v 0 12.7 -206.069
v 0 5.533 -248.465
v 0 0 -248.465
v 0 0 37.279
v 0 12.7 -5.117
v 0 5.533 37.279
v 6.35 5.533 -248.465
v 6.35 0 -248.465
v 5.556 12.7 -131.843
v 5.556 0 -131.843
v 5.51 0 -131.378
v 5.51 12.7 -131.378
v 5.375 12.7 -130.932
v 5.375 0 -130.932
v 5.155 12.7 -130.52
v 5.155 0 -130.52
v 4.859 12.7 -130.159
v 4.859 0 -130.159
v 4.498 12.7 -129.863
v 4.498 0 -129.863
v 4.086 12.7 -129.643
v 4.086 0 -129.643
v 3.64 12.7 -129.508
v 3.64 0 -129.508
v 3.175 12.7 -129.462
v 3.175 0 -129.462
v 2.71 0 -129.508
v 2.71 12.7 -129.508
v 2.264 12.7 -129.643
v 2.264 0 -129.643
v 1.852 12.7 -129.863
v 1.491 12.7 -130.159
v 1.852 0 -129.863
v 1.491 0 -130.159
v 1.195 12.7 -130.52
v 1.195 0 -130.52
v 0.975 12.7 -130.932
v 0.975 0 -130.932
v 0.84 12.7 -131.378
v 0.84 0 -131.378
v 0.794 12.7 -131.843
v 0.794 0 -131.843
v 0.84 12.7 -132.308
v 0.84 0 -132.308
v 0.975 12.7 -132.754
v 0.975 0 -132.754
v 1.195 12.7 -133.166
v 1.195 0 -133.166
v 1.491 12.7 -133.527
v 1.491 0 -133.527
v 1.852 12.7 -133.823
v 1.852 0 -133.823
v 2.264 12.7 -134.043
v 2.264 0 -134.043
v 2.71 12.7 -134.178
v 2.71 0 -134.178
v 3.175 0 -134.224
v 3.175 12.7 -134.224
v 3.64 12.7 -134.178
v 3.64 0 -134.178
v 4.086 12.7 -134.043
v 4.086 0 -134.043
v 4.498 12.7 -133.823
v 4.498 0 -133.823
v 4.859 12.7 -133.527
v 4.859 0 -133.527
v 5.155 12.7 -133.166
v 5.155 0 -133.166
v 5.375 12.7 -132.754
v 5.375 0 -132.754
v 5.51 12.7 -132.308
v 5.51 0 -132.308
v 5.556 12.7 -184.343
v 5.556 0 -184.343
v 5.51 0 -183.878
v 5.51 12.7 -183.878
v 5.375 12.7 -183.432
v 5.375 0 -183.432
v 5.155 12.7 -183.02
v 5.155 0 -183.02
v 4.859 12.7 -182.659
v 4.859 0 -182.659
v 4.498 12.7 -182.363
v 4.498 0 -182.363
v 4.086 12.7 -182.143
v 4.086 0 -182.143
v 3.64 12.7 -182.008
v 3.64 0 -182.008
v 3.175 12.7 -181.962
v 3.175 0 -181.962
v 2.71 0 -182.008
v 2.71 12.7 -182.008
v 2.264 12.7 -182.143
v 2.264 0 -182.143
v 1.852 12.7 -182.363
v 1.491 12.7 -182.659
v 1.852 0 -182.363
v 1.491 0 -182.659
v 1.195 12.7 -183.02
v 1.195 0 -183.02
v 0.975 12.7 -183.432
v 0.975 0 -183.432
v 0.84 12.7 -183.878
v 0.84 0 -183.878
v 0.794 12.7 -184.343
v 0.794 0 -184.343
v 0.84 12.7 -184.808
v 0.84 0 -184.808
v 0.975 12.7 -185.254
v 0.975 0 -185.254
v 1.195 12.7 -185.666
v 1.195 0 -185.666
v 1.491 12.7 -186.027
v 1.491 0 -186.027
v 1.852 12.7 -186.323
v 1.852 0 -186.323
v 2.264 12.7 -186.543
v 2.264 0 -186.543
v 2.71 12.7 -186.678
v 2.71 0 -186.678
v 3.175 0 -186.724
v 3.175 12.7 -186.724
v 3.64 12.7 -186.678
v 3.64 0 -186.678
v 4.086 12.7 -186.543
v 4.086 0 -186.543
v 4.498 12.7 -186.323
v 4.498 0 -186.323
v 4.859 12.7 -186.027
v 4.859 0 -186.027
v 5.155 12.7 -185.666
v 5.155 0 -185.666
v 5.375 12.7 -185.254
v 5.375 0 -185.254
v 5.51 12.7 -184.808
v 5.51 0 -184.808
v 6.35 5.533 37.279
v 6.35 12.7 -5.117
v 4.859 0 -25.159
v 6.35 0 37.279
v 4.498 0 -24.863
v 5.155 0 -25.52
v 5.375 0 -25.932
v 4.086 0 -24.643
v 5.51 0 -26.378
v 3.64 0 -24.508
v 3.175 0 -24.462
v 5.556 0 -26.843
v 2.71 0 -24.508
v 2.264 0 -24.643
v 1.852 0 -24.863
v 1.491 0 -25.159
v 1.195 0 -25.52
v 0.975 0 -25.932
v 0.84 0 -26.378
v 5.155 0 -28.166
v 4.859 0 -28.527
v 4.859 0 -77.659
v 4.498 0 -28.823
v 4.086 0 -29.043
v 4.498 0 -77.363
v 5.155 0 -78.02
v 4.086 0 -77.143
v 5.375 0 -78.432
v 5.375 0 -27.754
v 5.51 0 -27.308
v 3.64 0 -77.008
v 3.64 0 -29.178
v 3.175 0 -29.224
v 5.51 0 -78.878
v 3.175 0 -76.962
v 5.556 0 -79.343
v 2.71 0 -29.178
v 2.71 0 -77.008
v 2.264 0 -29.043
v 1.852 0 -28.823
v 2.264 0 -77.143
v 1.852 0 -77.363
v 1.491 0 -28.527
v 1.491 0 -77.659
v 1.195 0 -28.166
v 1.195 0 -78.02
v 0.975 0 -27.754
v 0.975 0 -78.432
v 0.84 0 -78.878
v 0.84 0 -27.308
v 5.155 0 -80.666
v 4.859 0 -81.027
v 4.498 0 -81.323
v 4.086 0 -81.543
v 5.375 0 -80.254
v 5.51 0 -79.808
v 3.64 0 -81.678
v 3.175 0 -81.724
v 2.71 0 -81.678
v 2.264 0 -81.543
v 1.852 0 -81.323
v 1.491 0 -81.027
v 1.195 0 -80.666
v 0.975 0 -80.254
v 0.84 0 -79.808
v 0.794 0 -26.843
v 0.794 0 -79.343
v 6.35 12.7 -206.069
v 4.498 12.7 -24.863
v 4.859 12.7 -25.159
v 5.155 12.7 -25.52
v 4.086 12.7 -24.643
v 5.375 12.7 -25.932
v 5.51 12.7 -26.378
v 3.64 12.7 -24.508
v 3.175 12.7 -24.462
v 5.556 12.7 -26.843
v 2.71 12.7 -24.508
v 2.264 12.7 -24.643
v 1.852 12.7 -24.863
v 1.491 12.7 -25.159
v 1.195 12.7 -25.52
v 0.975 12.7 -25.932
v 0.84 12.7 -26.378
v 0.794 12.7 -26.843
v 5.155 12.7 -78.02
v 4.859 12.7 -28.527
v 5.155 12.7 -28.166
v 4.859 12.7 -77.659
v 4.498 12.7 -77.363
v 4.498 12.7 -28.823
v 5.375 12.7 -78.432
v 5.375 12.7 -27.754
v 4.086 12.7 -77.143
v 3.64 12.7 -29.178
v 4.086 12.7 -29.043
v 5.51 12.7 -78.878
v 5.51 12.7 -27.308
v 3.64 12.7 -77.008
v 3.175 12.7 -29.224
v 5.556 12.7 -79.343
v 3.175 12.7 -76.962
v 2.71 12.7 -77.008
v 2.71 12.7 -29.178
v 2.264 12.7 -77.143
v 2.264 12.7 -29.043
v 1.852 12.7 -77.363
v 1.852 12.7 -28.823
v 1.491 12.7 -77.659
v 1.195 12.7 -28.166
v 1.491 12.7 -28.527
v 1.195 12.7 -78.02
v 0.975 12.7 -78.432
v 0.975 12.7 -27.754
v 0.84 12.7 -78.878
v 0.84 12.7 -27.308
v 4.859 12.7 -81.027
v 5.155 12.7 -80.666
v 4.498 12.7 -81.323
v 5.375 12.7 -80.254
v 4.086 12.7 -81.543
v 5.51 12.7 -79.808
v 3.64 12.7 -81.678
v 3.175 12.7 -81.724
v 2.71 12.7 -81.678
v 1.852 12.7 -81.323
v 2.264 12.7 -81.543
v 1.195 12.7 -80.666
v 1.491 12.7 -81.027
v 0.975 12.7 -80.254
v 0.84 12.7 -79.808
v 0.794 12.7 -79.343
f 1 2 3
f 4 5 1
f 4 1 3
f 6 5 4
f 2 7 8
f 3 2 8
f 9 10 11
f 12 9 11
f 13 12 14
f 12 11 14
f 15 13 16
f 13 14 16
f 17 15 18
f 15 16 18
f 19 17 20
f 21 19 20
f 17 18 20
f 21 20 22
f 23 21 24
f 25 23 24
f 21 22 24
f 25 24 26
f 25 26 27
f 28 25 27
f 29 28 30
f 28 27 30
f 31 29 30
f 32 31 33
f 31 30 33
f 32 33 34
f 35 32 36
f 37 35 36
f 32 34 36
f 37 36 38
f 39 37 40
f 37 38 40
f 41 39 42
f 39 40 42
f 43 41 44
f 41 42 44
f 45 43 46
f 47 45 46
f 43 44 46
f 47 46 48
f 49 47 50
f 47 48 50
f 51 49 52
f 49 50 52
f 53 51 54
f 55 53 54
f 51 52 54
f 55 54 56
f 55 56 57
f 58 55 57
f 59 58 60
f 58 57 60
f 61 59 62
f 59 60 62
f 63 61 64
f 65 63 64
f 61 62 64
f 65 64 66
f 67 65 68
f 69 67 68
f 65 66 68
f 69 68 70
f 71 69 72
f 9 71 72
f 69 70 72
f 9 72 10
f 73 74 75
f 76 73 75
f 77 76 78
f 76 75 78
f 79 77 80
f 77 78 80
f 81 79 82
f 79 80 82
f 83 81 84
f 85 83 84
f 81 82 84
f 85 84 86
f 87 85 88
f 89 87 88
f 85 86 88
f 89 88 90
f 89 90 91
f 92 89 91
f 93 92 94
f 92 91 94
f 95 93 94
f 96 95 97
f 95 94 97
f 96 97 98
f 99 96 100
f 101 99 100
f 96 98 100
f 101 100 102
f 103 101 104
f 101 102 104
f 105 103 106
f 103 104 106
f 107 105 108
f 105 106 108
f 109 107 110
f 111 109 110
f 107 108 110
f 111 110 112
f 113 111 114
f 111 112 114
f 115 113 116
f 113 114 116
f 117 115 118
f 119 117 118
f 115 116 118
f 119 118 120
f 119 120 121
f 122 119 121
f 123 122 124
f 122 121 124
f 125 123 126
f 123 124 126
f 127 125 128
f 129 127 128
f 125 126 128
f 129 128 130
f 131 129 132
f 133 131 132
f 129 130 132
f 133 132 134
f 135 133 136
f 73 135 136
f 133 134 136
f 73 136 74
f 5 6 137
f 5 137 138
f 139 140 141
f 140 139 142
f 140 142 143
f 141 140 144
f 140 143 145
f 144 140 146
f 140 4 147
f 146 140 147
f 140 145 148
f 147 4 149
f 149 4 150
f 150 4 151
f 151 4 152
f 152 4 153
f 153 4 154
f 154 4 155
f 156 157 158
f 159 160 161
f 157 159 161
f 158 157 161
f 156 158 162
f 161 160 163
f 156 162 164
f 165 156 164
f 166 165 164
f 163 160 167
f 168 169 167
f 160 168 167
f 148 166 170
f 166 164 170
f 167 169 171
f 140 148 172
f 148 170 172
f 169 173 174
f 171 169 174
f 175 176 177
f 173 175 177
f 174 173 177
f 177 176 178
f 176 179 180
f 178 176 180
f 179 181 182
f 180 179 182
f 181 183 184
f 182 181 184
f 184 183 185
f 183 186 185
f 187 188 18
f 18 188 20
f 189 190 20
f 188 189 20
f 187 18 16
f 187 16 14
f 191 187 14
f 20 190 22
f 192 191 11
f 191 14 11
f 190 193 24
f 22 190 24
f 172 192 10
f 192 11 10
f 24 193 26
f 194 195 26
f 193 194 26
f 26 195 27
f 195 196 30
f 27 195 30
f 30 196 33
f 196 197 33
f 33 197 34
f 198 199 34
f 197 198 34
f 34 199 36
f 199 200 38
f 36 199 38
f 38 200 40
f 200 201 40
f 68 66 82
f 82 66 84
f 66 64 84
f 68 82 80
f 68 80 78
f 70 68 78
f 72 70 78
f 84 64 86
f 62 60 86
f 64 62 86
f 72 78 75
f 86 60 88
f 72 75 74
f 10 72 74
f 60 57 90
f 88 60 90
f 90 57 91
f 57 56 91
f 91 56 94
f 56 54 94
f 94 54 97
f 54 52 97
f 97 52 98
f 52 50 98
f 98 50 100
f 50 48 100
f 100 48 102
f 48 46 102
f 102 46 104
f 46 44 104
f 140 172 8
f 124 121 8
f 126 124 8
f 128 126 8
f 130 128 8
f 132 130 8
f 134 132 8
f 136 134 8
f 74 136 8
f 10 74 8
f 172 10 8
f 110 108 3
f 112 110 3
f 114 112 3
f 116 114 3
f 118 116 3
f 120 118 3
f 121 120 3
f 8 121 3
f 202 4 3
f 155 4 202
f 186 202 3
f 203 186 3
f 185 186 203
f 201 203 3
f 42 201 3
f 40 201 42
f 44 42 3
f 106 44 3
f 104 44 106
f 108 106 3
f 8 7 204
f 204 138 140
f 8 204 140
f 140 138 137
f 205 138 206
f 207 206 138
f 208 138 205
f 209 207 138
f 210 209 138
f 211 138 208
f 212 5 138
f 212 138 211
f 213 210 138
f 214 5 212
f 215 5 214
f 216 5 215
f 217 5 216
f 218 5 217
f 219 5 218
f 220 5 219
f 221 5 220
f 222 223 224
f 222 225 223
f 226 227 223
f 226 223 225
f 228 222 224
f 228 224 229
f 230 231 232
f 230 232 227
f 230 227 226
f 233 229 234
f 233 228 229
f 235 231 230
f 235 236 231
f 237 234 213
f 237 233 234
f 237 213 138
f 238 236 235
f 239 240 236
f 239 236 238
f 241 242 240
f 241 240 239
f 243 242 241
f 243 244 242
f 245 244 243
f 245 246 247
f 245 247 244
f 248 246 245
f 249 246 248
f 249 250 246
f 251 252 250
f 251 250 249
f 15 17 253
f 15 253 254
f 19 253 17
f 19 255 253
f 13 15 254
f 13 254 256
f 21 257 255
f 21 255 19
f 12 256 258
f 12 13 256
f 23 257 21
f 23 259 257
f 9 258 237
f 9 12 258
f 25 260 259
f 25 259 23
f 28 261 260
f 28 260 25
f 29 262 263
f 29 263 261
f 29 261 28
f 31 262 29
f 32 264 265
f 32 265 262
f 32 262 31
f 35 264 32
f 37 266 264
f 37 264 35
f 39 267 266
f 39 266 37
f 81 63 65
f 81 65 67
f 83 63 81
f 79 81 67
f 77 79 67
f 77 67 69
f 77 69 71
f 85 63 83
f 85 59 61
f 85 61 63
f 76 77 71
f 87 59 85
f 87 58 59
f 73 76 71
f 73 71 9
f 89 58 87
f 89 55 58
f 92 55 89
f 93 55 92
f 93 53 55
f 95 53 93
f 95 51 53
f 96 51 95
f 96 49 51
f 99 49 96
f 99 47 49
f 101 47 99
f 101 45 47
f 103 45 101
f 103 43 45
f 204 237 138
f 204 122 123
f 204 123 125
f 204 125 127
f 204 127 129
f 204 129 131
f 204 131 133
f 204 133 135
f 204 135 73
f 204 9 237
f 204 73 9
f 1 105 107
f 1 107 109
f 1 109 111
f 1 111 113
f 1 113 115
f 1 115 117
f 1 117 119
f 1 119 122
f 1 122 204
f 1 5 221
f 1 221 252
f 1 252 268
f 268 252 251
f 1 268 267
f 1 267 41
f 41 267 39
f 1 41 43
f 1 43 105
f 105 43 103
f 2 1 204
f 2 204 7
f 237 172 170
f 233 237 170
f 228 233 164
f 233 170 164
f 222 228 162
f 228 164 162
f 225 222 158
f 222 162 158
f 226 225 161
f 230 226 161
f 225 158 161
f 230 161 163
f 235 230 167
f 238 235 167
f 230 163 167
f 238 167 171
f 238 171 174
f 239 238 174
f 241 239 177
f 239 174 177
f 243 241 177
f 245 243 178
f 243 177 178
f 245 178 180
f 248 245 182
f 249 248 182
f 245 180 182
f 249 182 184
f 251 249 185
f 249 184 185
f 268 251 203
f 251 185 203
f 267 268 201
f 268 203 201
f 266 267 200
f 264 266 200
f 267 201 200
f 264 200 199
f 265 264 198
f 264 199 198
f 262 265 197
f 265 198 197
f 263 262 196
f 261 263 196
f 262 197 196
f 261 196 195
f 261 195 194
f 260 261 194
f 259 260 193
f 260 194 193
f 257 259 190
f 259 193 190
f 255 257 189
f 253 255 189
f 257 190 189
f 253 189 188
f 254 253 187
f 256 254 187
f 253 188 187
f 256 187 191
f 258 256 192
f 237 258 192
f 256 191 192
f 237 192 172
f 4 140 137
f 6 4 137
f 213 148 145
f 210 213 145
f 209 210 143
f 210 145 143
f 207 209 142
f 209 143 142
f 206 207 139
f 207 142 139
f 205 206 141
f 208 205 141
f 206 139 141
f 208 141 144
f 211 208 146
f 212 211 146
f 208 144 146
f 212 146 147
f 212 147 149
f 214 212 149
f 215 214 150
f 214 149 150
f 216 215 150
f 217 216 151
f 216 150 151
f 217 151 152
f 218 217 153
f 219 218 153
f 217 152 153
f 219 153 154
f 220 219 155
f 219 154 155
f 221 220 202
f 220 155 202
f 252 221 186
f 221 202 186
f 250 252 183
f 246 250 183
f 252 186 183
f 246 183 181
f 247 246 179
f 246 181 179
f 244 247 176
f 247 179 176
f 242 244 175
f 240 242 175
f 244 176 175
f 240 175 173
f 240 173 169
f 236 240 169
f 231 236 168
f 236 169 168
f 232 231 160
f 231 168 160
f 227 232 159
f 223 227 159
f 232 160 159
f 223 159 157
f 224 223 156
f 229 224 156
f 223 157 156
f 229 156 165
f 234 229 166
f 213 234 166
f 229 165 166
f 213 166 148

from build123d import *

# Parameters (mm, degrees)
BOSS_EXTRUDE2_DEPTH = 6.35
SKETCH8_R           = 2.38125
CUT_EXTRUDE3_DEPTH  = 12.7


with BuildPart() as part:
    # Sketch7 → Boss-Extrude2 (new body)
    with BuildSketch(Plane(origin=(0, 0, 0), x_dir=(0, 0, -1), z_dir=(1, 0, 0))):
        Polygon((211.186, 0), (0, 0), (-37.279, 0), (-37.279, 5.533348483), (5.116676416, 12.7), (206.069323584, 12.7), (248.465, 5.533348483), (248.465, 0), align=None)
    extrude(amount=BOSS_EXTRUDE2_DEPTH)

    # Sketch8 → Cut-Extrude3 (cut)
    with BuildSketch(Plane.XZ):
        with Locations((3.175, -26.843)):
            Circle(SKETCH8_R)
        with Locations((3.175, -79.343)):
            Circle(SKETCH8_R)
        with Locations((3.175, -131.843)):
            Circle(SKETCH8_R)
        with Locations((3.175, -184.343)):
            Circle(SKETCH8_R)
    extrude(amount=-CUT_EXTRUDE3_DEPTH, mode=Mode.SUBTRACT)


solid = part.part
